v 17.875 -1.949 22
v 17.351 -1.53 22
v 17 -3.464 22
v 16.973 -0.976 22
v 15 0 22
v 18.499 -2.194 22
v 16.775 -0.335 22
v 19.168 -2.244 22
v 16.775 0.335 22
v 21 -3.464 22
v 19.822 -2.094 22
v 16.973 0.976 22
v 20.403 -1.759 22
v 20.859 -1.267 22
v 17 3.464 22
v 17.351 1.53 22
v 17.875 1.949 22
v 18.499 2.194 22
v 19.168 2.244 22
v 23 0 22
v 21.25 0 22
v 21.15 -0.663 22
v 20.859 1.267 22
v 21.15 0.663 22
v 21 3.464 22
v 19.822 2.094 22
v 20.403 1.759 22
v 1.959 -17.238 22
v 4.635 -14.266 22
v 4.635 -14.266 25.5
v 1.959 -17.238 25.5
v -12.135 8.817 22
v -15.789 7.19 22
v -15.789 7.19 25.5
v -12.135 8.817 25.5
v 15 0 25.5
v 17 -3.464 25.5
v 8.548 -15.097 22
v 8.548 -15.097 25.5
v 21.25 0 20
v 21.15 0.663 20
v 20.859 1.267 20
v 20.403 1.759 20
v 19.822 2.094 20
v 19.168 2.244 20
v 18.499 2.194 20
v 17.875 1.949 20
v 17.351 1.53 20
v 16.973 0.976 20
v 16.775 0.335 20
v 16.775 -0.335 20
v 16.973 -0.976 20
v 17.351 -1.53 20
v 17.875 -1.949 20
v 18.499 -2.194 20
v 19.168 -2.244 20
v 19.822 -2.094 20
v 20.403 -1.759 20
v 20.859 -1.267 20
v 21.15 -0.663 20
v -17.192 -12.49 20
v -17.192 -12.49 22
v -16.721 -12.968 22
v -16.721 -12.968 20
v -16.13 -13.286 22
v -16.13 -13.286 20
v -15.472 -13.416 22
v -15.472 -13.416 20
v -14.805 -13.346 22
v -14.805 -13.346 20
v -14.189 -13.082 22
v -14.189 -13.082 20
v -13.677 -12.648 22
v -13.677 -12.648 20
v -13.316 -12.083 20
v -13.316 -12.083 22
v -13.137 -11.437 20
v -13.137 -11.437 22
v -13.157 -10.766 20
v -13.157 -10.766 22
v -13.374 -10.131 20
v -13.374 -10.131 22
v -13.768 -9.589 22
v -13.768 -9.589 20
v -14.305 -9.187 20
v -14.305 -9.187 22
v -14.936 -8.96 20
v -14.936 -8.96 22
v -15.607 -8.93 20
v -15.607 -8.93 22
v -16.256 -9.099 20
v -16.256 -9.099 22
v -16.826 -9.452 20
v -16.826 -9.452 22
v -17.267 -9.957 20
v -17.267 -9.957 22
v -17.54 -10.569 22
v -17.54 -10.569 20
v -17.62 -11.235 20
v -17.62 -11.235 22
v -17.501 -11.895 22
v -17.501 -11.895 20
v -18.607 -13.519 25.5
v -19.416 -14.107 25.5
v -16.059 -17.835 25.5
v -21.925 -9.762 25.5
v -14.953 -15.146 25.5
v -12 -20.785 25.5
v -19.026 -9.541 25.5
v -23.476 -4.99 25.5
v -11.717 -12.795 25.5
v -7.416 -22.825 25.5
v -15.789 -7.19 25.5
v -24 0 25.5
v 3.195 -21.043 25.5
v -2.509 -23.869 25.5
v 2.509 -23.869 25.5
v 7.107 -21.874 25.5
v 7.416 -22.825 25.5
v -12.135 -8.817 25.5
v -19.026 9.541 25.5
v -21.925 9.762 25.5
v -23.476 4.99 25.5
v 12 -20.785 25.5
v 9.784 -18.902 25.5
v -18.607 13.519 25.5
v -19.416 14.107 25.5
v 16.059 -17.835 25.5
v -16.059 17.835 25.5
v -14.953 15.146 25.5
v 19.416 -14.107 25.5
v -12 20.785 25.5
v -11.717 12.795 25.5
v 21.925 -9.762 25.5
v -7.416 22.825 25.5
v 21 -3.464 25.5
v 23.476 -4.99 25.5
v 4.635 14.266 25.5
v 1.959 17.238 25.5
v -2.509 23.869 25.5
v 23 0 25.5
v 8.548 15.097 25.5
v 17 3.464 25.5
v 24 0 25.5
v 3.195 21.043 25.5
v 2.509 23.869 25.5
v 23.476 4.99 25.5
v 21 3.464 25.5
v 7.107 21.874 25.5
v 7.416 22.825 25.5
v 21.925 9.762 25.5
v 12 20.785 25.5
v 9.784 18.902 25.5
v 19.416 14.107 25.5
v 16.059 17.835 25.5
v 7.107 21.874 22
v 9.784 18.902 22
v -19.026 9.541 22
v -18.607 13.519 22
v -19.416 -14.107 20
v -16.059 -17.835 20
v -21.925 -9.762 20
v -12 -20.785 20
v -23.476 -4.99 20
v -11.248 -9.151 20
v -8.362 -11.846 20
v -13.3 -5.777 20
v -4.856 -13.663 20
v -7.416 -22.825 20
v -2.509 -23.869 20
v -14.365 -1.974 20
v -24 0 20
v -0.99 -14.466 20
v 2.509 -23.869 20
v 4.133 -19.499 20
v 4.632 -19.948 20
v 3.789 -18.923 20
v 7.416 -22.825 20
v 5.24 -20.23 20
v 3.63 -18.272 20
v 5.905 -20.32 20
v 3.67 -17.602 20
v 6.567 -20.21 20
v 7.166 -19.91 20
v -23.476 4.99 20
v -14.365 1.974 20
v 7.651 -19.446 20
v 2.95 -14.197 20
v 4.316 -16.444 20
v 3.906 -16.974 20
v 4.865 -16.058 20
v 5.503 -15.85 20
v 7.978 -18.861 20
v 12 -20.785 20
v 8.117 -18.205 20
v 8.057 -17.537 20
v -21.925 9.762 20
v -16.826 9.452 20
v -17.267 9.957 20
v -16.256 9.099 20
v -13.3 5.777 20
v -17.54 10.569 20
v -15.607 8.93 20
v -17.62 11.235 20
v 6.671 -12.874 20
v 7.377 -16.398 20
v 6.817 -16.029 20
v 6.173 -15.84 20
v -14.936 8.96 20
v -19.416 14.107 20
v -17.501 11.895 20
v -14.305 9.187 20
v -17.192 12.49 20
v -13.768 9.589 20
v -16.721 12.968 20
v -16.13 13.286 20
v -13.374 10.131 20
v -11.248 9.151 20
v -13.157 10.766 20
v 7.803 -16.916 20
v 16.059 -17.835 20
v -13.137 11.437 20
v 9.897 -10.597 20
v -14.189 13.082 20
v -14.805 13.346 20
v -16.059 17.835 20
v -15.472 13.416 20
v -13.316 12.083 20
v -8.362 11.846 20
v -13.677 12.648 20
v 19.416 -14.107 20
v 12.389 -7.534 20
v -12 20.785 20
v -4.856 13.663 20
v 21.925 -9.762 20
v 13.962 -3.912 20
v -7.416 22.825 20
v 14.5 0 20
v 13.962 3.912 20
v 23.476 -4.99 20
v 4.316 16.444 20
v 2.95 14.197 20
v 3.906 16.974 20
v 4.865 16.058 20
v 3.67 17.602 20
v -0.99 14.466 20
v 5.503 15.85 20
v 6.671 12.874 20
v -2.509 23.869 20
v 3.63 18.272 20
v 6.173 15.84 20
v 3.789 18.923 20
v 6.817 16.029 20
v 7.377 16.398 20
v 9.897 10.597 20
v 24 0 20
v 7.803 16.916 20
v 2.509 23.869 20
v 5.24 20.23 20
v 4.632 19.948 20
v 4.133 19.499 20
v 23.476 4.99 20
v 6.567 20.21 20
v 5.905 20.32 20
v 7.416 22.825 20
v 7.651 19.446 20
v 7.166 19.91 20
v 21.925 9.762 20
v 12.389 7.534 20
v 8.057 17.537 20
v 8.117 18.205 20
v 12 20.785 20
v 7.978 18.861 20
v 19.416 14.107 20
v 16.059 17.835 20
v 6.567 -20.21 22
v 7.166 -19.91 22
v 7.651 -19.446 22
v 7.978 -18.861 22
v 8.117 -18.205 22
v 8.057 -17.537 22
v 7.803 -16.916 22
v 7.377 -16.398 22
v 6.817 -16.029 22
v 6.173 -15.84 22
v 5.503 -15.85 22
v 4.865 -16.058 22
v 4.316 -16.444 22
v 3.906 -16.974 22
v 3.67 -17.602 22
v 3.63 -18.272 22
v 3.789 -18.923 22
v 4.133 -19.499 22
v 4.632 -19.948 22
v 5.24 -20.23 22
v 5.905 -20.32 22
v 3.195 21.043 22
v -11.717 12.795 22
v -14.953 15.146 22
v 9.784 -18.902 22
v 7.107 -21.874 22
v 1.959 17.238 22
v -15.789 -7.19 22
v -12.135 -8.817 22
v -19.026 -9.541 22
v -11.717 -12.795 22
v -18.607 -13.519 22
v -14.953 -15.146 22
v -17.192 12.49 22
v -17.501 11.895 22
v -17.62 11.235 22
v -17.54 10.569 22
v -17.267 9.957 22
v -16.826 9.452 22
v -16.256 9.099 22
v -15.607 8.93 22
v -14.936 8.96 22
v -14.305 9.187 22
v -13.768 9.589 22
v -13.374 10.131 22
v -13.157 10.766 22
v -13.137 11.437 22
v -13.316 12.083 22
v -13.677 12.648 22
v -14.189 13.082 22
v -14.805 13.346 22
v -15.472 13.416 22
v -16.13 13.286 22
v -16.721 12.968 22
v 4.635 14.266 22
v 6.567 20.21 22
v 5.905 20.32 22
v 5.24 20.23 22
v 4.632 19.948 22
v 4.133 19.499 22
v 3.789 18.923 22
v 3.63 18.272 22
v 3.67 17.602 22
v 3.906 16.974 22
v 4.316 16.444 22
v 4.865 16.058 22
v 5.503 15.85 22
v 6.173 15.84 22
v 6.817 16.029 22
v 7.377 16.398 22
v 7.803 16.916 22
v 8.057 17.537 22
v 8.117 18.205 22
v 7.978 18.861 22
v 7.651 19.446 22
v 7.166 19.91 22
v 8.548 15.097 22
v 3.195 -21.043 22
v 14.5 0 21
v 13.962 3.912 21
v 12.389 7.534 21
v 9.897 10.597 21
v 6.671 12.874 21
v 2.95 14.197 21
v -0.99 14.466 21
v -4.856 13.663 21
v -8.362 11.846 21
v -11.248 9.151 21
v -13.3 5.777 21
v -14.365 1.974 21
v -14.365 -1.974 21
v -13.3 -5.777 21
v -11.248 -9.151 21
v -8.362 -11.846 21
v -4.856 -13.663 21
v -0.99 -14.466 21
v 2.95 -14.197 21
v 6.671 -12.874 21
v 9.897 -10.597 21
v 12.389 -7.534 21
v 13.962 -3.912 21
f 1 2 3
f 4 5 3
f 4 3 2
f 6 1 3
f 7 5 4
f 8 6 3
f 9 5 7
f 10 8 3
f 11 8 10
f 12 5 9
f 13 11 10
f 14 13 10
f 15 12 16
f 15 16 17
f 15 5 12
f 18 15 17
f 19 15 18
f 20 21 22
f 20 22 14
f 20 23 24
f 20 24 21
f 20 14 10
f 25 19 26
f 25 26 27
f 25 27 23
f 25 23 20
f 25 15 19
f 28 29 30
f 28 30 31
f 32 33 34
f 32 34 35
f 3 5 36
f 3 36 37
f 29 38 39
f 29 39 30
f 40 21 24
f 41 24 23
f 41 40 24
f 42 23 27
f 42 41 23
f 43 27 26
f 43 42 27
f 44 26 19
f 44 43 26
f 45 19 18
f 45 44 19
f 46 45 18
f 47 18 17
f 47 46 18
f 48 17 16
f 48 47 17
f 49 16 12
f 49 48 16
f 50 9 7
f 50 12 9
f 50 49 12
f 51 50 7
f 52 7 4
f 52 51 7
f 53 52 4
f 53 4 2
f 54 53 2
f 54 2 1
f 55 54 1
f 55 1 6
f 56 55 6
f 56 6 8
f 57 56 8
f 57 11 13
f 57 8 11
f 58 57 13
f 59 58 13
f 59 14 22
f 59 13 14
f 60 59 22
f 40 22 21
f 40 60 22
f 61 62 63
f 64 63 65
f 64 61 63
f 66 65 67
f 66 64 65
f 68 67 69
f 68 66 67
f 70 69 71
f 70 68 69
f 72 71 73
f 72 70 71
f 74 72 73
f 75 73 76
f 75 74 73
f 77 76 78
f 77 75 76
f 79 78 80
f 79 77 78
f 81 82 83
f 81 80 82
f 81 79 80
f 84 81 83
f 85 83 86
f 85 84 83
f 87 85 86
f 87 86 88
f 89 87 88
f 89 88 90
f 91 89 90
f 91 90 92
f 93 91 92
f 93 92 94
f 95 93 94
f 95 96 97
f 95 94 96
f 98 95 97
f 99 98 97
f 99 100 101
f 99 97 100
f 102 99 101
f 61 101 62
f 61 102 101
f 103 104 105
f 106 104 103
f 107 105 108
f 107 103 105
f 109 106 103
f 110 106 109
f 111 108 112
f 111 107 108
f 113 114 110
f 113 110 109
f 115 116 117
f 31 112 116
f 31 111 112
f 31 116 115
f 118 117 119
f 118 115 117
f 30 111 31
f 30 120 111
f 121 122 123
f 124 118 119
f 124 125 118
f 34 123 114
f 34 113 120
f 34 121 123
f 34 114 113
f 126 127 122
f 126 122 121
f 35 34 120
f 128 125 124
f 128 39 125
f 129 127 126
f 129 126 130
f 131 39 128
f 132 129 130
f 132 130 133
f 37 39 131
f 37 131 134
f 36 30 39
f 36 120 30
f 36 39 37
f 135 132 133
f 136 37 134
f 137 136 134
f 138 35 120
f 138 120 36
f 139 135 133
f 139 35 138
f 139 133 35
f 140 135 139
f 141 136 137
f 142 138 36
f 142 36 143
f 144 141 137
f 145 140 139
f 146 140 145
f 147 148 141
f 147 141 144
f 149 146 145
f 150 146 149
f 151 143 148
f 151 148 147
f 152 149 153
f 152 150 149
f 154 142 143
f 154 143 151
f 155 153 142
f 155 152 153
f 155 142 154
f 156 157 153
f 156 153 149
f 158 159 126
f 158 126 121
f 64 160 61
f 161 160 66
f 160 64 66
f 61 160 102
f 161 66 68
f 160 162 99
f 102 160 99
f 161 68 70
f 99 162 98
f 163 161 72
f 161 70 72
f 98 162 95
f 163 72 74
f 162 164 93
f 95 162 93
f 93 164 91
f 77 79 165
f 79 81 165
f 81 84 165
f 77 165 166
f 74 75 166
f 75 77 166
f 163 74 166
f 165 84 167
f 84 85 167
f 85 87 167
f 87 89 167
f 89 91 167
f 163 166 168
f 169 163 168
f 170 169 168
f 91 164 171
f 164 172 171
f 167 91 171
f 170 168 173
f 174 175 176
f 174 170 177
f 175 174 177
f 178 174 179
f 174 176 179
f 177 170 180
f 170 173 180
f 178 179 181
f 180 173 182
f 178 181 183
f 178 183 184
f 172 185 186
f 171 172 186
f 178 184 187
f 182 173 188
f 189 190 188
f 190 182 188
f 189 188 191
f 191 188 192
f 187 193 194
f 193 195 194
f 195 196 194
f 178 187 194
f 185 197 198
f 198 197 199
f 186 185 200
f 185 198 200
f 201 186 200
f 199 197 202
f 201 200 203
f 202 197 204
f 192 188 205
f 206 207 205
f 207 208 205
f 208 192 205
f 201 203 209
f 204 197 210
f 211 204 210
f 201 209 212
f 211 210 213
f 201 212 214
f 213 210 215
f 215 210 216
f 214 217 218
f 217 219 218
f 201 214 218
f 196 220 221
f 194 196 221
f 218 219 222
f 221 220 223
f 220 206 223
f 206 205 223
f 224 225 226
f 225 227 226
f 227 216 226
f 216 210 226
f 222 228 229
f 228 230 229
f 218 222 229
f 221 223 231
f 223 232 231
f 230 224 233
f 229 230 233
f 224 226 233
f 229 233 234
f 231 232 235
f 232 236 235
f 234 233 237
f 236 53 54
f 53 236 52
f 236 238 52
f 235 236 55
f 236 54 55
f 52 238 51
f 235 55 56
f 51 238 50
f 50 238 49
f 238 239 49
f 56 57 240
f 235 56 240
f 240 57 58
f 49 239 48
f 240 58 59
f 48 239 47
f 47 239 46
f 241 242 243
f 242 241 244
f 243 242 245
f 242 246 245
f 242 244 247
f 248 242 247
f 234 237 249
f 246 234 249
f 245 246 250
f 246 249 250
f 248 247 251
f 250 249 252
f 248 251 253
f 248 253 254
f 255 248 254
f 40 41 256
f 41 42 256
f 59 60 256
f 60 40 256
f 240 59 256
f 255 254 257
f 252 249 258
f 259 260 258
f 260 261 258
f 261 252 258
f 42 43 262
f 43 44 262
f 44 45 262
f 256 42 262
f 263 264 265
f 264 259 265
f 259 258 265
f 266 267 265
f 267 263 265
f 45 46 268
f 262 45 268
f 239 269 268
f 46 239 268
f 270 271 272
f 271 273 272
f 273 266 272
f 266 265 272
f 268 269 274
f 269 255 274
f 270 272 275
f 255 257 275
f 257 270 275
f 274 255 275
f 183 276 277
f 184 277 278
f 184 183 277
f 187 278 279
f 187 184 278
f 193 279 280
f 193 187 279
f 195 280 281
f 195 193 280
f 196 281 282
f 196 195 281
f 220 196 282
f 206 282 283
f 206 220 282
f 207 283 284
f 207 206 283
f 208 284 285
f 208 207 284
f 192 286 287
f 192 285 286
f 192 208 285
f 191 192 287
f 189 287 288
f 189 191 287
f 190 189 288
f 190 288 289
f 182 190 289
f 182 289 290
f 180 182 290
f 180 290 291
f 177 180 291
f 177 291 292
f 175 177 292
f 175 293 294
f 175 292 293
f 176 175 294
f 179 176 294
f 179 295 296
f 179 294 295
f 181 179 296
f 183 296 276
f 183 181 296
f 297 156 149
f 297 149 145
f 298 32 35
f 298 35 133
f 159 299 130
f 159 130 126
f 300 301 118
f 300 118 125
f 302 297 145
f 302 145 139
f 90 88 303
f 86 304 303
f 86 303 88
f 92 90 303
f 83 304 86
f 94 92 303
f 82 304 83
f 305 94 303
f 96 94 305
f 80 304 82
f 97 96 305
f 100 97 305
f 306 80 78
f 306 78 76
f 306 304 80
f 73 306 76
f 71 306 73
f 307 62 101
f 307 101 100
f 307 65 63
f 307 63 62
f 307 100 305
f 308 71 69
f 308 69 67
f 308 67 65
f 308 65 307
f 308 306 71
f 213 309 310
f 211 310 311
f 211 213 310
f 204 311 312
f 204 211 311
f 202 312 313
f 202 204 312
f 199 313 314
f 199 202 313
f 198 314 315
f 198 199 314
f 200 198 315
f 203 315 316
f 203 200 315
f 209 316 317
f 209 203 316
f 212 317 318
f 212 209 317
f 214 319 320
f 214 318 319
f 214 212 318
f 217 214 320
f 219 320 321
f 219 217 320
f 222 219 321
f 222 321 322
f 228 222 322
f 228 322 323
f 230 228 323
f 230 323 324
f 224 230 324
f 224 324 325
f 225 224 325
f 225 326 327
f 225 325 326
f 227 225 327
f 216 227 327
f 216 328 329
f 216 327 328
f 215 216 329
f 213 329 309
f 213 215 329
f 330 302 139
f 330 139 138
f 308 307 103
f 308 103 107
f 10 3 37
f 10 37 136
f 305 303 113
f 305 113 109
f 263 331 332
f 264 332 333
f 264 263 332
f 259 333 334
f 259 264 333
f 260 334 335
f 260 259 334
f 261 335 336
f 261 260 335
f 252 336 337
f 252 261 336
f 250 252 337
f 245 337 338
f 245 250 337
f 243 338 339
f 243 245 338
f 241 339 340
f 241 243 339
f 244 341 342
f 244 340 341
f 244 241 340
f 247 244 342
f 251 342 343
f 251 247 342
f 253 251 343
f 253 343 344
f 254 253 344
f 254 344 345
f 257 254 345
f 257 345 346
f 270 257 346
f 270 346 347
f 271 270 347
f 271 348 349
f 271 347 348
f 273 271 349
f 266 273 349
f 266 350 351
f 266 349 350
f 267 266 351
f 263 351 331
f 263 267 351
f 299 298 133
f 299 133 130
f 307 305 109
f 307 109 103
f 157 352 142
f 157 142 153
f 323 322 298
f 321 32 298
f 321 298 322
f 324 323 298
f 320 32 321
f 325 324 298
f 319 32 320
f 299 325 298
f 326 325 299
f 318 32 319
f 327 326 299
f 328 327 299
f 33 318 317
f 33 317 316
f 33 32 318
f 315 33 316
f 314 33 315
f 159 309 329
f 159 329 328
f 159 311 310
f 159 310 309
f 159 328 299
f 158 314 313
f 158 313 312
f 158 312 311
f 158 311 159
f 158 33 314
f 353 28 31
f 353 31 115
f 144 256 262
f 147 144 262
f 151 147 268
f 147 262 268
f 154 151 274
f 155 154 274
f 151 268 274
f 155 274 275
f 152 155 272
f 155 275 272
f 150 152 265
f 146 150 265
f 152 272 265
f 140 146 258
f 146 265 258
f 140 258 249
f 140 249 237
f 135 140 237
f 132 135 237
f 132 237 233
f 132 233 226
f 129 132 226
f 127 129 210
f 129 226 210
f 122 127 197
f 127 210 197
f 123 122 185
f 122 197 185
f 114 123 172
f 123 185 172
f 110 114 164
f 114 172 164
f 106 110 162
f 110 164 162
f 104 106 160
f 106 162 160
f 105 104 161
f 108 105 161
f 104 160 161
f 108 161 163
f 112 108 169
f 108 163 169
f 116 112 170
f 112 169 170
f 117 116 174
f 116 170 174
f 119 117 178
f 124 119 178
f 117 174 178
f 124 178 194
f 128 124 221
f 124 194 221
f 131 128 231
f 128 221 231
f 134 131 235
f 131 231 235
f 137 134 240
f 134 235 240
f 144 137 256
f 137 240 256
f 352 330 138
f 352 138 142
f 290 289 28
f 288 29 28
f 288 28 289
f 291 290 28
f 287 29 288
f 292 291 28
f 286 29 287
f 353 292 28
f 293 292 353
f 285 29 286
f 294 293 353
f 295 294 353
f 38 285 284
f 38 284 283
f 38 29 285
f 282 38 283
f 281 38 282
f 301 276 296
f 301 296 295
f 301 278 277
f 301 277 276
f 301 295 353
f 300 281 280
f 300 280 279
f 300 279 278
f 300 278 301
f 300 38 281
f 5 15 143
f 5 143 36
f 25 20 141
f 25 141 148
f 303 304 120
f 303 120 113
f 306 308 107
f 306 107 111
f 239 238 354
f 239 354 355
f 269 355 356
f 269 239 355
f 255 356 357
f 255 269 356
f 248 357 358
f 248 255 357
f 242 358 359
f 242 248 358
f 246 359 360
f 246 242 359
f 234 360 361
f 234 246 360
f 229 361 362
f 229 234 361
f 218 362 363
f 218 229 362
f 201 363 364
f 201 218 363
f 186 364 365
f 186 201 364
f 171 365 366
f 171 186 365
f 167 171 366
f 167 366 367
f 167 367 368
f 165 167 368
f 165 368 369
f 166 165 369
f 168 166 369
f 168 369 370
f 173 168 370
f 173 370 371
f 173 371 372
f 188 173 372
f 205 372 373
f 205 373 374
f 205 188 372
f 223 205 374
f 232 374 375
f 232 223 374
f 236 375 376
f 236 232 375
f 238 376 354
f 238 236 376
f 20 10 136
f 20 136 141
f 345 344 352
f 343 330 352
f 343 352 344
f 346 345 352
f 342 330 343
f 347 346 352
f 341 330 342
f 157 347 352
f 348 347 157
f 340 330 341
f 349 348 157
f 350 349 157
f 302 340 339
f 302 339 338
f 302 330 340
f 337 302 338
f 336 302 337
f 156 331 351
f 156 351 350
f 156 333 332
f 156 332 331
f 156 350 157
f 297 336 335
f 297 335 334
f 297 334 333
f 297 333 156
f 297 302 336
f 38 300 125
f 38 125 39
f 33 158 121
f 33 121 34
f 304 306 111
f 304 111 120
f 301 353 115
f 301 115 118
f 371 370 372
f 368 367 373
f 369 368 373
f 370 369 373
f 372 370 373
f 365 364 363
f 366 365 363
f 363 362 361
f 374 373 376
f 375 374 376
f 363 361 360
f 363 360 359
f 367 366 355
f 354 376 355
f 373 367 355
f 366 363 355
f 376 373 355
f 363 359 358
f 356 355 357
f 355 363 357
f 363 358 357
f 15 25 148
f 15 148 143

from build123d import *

# Parameters (mm, degrees)
CYLINDER012_R     = 14.5
CYLINDER012_DEPTH = 1
PAD_DEPTH         = 3.5
CYLINDER011_R     = 2.25
CYLINDER011_DEPTH = 10
ARRAY002_COUNT    = 5
CYLINDER010_R     = 24
CYLINDER010_DEPTH = 5.5


with BuildPart() as cylinder012:
    # Cylinder012 → Cylinder012 (new body)
    with BuildSketch(Plane.XY.offset(20)):
        Circle(CYLINDER012_R)
    extrude(amount=CYLINDER012_DEPTH)


with BuildPart() as pressfitm4:
    # Sketch → Pad (new body)
    with BuildSketch(Plane.XY):
        Polygon((4, 0), (2, 3.464102), (-2, 3.464102), (-4, 0), (-2, -3.464102), (2, -3.464102), align=None)
    extrude(amount=PAD_DEPTH)


with BuildPart() as pressfitm4_1:
    # Body placement: moved
    add(pressfitm4.part.moved(Location((19, 0, 22))))


with BuildPart() as array002:
    # Cylinder011 → Cylinder011 (new body)
    with BuildSketch(Plane(origin=(19, 0, 20), x_dir=(1, 0, 0), z_dir=(0, 0, 1))):
        Circle(CYLINDER011_R)
    extrude(amount=CYLINDER011_DEPTH)

    # Fusion003: union PressfitM4
    add(pressfitm4_1.part)

    # Array002: Array002 ×5 about axis
    array002_axis = Axis((0, 0, 0), (0, 0, 1))


with BuildPart() as array002_1:
    add(array002.part)
    for i in range(1, ARRAY002_COUNT):
        add(array002.part.rotate(array002_axis, i * 360 / ARRAY002_COUNT))


with BuildPart() as cut006:
    # Cylinder010 → Cylinder010 (new body)
    with BuildSketch(Plane.XY.offset(20)):
        Circle(CYLINDER010_R)
    extrude(amount=CYLINDER010_DEPTH)

    # Cut005: cut Array002
    add(array002_1.part, mode=Mode.SUBTRACT)

    # Cut006: cut Cylinder012
    add(cylinder012.part, mode=Mode.SUBTRACT)


solid = cut006.part
